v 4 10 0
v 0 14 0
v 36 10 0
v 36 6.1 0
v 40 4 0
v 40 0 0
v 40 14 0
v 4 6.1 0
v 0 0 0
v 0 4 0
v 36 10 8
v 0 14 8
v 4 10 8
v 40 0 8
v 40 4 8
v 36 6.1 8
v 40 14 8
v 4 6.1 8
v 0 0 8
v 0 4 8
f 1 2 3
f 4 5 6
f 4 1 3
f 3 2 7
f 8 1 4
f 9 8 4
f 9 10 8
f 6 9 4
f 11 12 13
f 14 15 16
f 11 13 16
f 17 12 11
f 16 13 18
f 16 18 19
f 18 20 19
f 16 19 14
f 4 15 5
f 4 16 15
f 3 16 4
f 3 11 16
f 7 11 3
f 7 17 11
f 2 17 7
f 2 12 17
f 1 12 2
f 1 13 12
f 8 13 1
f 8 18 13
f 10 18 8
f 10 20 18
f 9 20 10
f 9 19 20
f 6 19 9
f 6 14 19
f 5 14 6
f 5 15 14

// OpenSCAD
$fn = 32;

// ----------------------------------------------------------------------
// Key bar: dovetail key, 8 mm thick
// ----------------------------------------------------------------------

// --- parameters (mm) ---
profile_height = 8;       // extrusion height
profile_points = 10;      // points of the closed outline

profile = [[0, 0], [40, 0], [40, 4], [36, 6.1], [36, 10], [40, 14], [0, 14], [4, 10], [4, 6.1], [0, 4]];  // single closed polygon, 10 points, counter clockwise

// --- the one profile operation ---
linear_extrude(height = profile_height) polygon(points = profile);
